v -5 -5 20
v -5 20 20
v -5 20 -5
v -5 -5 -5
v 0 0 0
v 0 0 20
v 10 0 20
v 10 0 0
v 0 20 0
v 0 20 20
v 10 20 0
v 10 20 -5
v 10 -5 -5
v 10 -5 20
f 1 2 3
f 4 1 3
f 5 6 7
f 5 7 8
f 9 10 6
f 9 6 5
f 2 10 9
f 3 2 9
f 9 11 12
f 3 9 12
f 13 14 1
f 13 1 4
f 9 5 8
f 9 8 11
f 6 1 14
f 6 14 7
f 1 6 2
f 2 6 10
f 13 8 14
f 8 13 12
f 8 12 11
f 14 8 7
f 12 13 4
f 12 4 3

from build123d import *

# Parameters (mm, degrees)
BOSS_EXTRUDE1_DEPTH = 10
SKETCH2_W           = 25
SKETCH2_H           = 25
BOSS_EXTRUDE2_DEPTH = 5


with BuildPart() as part:
    # Sketch1 → Boss-Extrude1 (new body)
    with BuildSketch(Plane(origin=(0, 0, 0), x_dir=(0, 0, -1), z_dir=(1, 0, 0))):
        Polygon((0, 0), (0, 20), (5, 20), (5, -5), (-20, -5), (-20, 0), align=None)
    extrude(amount=BOSS_EXTRUDE1_DEPTH)

    # Sketch2 → Boss-Extrude2 (add)
    with BuildSketch(Plane(origin=(0, 0, 0), x_dir=(0, 0, -1), z_dir=(1, 0, 0))):
        with Locations((-7.5, 7.5)):
            Rectangle(SKETCH2_W, SKETCH2_H)
    extrude(amount=-BOSS_EXTRUDE2_DEPTH)


solid = part.part
